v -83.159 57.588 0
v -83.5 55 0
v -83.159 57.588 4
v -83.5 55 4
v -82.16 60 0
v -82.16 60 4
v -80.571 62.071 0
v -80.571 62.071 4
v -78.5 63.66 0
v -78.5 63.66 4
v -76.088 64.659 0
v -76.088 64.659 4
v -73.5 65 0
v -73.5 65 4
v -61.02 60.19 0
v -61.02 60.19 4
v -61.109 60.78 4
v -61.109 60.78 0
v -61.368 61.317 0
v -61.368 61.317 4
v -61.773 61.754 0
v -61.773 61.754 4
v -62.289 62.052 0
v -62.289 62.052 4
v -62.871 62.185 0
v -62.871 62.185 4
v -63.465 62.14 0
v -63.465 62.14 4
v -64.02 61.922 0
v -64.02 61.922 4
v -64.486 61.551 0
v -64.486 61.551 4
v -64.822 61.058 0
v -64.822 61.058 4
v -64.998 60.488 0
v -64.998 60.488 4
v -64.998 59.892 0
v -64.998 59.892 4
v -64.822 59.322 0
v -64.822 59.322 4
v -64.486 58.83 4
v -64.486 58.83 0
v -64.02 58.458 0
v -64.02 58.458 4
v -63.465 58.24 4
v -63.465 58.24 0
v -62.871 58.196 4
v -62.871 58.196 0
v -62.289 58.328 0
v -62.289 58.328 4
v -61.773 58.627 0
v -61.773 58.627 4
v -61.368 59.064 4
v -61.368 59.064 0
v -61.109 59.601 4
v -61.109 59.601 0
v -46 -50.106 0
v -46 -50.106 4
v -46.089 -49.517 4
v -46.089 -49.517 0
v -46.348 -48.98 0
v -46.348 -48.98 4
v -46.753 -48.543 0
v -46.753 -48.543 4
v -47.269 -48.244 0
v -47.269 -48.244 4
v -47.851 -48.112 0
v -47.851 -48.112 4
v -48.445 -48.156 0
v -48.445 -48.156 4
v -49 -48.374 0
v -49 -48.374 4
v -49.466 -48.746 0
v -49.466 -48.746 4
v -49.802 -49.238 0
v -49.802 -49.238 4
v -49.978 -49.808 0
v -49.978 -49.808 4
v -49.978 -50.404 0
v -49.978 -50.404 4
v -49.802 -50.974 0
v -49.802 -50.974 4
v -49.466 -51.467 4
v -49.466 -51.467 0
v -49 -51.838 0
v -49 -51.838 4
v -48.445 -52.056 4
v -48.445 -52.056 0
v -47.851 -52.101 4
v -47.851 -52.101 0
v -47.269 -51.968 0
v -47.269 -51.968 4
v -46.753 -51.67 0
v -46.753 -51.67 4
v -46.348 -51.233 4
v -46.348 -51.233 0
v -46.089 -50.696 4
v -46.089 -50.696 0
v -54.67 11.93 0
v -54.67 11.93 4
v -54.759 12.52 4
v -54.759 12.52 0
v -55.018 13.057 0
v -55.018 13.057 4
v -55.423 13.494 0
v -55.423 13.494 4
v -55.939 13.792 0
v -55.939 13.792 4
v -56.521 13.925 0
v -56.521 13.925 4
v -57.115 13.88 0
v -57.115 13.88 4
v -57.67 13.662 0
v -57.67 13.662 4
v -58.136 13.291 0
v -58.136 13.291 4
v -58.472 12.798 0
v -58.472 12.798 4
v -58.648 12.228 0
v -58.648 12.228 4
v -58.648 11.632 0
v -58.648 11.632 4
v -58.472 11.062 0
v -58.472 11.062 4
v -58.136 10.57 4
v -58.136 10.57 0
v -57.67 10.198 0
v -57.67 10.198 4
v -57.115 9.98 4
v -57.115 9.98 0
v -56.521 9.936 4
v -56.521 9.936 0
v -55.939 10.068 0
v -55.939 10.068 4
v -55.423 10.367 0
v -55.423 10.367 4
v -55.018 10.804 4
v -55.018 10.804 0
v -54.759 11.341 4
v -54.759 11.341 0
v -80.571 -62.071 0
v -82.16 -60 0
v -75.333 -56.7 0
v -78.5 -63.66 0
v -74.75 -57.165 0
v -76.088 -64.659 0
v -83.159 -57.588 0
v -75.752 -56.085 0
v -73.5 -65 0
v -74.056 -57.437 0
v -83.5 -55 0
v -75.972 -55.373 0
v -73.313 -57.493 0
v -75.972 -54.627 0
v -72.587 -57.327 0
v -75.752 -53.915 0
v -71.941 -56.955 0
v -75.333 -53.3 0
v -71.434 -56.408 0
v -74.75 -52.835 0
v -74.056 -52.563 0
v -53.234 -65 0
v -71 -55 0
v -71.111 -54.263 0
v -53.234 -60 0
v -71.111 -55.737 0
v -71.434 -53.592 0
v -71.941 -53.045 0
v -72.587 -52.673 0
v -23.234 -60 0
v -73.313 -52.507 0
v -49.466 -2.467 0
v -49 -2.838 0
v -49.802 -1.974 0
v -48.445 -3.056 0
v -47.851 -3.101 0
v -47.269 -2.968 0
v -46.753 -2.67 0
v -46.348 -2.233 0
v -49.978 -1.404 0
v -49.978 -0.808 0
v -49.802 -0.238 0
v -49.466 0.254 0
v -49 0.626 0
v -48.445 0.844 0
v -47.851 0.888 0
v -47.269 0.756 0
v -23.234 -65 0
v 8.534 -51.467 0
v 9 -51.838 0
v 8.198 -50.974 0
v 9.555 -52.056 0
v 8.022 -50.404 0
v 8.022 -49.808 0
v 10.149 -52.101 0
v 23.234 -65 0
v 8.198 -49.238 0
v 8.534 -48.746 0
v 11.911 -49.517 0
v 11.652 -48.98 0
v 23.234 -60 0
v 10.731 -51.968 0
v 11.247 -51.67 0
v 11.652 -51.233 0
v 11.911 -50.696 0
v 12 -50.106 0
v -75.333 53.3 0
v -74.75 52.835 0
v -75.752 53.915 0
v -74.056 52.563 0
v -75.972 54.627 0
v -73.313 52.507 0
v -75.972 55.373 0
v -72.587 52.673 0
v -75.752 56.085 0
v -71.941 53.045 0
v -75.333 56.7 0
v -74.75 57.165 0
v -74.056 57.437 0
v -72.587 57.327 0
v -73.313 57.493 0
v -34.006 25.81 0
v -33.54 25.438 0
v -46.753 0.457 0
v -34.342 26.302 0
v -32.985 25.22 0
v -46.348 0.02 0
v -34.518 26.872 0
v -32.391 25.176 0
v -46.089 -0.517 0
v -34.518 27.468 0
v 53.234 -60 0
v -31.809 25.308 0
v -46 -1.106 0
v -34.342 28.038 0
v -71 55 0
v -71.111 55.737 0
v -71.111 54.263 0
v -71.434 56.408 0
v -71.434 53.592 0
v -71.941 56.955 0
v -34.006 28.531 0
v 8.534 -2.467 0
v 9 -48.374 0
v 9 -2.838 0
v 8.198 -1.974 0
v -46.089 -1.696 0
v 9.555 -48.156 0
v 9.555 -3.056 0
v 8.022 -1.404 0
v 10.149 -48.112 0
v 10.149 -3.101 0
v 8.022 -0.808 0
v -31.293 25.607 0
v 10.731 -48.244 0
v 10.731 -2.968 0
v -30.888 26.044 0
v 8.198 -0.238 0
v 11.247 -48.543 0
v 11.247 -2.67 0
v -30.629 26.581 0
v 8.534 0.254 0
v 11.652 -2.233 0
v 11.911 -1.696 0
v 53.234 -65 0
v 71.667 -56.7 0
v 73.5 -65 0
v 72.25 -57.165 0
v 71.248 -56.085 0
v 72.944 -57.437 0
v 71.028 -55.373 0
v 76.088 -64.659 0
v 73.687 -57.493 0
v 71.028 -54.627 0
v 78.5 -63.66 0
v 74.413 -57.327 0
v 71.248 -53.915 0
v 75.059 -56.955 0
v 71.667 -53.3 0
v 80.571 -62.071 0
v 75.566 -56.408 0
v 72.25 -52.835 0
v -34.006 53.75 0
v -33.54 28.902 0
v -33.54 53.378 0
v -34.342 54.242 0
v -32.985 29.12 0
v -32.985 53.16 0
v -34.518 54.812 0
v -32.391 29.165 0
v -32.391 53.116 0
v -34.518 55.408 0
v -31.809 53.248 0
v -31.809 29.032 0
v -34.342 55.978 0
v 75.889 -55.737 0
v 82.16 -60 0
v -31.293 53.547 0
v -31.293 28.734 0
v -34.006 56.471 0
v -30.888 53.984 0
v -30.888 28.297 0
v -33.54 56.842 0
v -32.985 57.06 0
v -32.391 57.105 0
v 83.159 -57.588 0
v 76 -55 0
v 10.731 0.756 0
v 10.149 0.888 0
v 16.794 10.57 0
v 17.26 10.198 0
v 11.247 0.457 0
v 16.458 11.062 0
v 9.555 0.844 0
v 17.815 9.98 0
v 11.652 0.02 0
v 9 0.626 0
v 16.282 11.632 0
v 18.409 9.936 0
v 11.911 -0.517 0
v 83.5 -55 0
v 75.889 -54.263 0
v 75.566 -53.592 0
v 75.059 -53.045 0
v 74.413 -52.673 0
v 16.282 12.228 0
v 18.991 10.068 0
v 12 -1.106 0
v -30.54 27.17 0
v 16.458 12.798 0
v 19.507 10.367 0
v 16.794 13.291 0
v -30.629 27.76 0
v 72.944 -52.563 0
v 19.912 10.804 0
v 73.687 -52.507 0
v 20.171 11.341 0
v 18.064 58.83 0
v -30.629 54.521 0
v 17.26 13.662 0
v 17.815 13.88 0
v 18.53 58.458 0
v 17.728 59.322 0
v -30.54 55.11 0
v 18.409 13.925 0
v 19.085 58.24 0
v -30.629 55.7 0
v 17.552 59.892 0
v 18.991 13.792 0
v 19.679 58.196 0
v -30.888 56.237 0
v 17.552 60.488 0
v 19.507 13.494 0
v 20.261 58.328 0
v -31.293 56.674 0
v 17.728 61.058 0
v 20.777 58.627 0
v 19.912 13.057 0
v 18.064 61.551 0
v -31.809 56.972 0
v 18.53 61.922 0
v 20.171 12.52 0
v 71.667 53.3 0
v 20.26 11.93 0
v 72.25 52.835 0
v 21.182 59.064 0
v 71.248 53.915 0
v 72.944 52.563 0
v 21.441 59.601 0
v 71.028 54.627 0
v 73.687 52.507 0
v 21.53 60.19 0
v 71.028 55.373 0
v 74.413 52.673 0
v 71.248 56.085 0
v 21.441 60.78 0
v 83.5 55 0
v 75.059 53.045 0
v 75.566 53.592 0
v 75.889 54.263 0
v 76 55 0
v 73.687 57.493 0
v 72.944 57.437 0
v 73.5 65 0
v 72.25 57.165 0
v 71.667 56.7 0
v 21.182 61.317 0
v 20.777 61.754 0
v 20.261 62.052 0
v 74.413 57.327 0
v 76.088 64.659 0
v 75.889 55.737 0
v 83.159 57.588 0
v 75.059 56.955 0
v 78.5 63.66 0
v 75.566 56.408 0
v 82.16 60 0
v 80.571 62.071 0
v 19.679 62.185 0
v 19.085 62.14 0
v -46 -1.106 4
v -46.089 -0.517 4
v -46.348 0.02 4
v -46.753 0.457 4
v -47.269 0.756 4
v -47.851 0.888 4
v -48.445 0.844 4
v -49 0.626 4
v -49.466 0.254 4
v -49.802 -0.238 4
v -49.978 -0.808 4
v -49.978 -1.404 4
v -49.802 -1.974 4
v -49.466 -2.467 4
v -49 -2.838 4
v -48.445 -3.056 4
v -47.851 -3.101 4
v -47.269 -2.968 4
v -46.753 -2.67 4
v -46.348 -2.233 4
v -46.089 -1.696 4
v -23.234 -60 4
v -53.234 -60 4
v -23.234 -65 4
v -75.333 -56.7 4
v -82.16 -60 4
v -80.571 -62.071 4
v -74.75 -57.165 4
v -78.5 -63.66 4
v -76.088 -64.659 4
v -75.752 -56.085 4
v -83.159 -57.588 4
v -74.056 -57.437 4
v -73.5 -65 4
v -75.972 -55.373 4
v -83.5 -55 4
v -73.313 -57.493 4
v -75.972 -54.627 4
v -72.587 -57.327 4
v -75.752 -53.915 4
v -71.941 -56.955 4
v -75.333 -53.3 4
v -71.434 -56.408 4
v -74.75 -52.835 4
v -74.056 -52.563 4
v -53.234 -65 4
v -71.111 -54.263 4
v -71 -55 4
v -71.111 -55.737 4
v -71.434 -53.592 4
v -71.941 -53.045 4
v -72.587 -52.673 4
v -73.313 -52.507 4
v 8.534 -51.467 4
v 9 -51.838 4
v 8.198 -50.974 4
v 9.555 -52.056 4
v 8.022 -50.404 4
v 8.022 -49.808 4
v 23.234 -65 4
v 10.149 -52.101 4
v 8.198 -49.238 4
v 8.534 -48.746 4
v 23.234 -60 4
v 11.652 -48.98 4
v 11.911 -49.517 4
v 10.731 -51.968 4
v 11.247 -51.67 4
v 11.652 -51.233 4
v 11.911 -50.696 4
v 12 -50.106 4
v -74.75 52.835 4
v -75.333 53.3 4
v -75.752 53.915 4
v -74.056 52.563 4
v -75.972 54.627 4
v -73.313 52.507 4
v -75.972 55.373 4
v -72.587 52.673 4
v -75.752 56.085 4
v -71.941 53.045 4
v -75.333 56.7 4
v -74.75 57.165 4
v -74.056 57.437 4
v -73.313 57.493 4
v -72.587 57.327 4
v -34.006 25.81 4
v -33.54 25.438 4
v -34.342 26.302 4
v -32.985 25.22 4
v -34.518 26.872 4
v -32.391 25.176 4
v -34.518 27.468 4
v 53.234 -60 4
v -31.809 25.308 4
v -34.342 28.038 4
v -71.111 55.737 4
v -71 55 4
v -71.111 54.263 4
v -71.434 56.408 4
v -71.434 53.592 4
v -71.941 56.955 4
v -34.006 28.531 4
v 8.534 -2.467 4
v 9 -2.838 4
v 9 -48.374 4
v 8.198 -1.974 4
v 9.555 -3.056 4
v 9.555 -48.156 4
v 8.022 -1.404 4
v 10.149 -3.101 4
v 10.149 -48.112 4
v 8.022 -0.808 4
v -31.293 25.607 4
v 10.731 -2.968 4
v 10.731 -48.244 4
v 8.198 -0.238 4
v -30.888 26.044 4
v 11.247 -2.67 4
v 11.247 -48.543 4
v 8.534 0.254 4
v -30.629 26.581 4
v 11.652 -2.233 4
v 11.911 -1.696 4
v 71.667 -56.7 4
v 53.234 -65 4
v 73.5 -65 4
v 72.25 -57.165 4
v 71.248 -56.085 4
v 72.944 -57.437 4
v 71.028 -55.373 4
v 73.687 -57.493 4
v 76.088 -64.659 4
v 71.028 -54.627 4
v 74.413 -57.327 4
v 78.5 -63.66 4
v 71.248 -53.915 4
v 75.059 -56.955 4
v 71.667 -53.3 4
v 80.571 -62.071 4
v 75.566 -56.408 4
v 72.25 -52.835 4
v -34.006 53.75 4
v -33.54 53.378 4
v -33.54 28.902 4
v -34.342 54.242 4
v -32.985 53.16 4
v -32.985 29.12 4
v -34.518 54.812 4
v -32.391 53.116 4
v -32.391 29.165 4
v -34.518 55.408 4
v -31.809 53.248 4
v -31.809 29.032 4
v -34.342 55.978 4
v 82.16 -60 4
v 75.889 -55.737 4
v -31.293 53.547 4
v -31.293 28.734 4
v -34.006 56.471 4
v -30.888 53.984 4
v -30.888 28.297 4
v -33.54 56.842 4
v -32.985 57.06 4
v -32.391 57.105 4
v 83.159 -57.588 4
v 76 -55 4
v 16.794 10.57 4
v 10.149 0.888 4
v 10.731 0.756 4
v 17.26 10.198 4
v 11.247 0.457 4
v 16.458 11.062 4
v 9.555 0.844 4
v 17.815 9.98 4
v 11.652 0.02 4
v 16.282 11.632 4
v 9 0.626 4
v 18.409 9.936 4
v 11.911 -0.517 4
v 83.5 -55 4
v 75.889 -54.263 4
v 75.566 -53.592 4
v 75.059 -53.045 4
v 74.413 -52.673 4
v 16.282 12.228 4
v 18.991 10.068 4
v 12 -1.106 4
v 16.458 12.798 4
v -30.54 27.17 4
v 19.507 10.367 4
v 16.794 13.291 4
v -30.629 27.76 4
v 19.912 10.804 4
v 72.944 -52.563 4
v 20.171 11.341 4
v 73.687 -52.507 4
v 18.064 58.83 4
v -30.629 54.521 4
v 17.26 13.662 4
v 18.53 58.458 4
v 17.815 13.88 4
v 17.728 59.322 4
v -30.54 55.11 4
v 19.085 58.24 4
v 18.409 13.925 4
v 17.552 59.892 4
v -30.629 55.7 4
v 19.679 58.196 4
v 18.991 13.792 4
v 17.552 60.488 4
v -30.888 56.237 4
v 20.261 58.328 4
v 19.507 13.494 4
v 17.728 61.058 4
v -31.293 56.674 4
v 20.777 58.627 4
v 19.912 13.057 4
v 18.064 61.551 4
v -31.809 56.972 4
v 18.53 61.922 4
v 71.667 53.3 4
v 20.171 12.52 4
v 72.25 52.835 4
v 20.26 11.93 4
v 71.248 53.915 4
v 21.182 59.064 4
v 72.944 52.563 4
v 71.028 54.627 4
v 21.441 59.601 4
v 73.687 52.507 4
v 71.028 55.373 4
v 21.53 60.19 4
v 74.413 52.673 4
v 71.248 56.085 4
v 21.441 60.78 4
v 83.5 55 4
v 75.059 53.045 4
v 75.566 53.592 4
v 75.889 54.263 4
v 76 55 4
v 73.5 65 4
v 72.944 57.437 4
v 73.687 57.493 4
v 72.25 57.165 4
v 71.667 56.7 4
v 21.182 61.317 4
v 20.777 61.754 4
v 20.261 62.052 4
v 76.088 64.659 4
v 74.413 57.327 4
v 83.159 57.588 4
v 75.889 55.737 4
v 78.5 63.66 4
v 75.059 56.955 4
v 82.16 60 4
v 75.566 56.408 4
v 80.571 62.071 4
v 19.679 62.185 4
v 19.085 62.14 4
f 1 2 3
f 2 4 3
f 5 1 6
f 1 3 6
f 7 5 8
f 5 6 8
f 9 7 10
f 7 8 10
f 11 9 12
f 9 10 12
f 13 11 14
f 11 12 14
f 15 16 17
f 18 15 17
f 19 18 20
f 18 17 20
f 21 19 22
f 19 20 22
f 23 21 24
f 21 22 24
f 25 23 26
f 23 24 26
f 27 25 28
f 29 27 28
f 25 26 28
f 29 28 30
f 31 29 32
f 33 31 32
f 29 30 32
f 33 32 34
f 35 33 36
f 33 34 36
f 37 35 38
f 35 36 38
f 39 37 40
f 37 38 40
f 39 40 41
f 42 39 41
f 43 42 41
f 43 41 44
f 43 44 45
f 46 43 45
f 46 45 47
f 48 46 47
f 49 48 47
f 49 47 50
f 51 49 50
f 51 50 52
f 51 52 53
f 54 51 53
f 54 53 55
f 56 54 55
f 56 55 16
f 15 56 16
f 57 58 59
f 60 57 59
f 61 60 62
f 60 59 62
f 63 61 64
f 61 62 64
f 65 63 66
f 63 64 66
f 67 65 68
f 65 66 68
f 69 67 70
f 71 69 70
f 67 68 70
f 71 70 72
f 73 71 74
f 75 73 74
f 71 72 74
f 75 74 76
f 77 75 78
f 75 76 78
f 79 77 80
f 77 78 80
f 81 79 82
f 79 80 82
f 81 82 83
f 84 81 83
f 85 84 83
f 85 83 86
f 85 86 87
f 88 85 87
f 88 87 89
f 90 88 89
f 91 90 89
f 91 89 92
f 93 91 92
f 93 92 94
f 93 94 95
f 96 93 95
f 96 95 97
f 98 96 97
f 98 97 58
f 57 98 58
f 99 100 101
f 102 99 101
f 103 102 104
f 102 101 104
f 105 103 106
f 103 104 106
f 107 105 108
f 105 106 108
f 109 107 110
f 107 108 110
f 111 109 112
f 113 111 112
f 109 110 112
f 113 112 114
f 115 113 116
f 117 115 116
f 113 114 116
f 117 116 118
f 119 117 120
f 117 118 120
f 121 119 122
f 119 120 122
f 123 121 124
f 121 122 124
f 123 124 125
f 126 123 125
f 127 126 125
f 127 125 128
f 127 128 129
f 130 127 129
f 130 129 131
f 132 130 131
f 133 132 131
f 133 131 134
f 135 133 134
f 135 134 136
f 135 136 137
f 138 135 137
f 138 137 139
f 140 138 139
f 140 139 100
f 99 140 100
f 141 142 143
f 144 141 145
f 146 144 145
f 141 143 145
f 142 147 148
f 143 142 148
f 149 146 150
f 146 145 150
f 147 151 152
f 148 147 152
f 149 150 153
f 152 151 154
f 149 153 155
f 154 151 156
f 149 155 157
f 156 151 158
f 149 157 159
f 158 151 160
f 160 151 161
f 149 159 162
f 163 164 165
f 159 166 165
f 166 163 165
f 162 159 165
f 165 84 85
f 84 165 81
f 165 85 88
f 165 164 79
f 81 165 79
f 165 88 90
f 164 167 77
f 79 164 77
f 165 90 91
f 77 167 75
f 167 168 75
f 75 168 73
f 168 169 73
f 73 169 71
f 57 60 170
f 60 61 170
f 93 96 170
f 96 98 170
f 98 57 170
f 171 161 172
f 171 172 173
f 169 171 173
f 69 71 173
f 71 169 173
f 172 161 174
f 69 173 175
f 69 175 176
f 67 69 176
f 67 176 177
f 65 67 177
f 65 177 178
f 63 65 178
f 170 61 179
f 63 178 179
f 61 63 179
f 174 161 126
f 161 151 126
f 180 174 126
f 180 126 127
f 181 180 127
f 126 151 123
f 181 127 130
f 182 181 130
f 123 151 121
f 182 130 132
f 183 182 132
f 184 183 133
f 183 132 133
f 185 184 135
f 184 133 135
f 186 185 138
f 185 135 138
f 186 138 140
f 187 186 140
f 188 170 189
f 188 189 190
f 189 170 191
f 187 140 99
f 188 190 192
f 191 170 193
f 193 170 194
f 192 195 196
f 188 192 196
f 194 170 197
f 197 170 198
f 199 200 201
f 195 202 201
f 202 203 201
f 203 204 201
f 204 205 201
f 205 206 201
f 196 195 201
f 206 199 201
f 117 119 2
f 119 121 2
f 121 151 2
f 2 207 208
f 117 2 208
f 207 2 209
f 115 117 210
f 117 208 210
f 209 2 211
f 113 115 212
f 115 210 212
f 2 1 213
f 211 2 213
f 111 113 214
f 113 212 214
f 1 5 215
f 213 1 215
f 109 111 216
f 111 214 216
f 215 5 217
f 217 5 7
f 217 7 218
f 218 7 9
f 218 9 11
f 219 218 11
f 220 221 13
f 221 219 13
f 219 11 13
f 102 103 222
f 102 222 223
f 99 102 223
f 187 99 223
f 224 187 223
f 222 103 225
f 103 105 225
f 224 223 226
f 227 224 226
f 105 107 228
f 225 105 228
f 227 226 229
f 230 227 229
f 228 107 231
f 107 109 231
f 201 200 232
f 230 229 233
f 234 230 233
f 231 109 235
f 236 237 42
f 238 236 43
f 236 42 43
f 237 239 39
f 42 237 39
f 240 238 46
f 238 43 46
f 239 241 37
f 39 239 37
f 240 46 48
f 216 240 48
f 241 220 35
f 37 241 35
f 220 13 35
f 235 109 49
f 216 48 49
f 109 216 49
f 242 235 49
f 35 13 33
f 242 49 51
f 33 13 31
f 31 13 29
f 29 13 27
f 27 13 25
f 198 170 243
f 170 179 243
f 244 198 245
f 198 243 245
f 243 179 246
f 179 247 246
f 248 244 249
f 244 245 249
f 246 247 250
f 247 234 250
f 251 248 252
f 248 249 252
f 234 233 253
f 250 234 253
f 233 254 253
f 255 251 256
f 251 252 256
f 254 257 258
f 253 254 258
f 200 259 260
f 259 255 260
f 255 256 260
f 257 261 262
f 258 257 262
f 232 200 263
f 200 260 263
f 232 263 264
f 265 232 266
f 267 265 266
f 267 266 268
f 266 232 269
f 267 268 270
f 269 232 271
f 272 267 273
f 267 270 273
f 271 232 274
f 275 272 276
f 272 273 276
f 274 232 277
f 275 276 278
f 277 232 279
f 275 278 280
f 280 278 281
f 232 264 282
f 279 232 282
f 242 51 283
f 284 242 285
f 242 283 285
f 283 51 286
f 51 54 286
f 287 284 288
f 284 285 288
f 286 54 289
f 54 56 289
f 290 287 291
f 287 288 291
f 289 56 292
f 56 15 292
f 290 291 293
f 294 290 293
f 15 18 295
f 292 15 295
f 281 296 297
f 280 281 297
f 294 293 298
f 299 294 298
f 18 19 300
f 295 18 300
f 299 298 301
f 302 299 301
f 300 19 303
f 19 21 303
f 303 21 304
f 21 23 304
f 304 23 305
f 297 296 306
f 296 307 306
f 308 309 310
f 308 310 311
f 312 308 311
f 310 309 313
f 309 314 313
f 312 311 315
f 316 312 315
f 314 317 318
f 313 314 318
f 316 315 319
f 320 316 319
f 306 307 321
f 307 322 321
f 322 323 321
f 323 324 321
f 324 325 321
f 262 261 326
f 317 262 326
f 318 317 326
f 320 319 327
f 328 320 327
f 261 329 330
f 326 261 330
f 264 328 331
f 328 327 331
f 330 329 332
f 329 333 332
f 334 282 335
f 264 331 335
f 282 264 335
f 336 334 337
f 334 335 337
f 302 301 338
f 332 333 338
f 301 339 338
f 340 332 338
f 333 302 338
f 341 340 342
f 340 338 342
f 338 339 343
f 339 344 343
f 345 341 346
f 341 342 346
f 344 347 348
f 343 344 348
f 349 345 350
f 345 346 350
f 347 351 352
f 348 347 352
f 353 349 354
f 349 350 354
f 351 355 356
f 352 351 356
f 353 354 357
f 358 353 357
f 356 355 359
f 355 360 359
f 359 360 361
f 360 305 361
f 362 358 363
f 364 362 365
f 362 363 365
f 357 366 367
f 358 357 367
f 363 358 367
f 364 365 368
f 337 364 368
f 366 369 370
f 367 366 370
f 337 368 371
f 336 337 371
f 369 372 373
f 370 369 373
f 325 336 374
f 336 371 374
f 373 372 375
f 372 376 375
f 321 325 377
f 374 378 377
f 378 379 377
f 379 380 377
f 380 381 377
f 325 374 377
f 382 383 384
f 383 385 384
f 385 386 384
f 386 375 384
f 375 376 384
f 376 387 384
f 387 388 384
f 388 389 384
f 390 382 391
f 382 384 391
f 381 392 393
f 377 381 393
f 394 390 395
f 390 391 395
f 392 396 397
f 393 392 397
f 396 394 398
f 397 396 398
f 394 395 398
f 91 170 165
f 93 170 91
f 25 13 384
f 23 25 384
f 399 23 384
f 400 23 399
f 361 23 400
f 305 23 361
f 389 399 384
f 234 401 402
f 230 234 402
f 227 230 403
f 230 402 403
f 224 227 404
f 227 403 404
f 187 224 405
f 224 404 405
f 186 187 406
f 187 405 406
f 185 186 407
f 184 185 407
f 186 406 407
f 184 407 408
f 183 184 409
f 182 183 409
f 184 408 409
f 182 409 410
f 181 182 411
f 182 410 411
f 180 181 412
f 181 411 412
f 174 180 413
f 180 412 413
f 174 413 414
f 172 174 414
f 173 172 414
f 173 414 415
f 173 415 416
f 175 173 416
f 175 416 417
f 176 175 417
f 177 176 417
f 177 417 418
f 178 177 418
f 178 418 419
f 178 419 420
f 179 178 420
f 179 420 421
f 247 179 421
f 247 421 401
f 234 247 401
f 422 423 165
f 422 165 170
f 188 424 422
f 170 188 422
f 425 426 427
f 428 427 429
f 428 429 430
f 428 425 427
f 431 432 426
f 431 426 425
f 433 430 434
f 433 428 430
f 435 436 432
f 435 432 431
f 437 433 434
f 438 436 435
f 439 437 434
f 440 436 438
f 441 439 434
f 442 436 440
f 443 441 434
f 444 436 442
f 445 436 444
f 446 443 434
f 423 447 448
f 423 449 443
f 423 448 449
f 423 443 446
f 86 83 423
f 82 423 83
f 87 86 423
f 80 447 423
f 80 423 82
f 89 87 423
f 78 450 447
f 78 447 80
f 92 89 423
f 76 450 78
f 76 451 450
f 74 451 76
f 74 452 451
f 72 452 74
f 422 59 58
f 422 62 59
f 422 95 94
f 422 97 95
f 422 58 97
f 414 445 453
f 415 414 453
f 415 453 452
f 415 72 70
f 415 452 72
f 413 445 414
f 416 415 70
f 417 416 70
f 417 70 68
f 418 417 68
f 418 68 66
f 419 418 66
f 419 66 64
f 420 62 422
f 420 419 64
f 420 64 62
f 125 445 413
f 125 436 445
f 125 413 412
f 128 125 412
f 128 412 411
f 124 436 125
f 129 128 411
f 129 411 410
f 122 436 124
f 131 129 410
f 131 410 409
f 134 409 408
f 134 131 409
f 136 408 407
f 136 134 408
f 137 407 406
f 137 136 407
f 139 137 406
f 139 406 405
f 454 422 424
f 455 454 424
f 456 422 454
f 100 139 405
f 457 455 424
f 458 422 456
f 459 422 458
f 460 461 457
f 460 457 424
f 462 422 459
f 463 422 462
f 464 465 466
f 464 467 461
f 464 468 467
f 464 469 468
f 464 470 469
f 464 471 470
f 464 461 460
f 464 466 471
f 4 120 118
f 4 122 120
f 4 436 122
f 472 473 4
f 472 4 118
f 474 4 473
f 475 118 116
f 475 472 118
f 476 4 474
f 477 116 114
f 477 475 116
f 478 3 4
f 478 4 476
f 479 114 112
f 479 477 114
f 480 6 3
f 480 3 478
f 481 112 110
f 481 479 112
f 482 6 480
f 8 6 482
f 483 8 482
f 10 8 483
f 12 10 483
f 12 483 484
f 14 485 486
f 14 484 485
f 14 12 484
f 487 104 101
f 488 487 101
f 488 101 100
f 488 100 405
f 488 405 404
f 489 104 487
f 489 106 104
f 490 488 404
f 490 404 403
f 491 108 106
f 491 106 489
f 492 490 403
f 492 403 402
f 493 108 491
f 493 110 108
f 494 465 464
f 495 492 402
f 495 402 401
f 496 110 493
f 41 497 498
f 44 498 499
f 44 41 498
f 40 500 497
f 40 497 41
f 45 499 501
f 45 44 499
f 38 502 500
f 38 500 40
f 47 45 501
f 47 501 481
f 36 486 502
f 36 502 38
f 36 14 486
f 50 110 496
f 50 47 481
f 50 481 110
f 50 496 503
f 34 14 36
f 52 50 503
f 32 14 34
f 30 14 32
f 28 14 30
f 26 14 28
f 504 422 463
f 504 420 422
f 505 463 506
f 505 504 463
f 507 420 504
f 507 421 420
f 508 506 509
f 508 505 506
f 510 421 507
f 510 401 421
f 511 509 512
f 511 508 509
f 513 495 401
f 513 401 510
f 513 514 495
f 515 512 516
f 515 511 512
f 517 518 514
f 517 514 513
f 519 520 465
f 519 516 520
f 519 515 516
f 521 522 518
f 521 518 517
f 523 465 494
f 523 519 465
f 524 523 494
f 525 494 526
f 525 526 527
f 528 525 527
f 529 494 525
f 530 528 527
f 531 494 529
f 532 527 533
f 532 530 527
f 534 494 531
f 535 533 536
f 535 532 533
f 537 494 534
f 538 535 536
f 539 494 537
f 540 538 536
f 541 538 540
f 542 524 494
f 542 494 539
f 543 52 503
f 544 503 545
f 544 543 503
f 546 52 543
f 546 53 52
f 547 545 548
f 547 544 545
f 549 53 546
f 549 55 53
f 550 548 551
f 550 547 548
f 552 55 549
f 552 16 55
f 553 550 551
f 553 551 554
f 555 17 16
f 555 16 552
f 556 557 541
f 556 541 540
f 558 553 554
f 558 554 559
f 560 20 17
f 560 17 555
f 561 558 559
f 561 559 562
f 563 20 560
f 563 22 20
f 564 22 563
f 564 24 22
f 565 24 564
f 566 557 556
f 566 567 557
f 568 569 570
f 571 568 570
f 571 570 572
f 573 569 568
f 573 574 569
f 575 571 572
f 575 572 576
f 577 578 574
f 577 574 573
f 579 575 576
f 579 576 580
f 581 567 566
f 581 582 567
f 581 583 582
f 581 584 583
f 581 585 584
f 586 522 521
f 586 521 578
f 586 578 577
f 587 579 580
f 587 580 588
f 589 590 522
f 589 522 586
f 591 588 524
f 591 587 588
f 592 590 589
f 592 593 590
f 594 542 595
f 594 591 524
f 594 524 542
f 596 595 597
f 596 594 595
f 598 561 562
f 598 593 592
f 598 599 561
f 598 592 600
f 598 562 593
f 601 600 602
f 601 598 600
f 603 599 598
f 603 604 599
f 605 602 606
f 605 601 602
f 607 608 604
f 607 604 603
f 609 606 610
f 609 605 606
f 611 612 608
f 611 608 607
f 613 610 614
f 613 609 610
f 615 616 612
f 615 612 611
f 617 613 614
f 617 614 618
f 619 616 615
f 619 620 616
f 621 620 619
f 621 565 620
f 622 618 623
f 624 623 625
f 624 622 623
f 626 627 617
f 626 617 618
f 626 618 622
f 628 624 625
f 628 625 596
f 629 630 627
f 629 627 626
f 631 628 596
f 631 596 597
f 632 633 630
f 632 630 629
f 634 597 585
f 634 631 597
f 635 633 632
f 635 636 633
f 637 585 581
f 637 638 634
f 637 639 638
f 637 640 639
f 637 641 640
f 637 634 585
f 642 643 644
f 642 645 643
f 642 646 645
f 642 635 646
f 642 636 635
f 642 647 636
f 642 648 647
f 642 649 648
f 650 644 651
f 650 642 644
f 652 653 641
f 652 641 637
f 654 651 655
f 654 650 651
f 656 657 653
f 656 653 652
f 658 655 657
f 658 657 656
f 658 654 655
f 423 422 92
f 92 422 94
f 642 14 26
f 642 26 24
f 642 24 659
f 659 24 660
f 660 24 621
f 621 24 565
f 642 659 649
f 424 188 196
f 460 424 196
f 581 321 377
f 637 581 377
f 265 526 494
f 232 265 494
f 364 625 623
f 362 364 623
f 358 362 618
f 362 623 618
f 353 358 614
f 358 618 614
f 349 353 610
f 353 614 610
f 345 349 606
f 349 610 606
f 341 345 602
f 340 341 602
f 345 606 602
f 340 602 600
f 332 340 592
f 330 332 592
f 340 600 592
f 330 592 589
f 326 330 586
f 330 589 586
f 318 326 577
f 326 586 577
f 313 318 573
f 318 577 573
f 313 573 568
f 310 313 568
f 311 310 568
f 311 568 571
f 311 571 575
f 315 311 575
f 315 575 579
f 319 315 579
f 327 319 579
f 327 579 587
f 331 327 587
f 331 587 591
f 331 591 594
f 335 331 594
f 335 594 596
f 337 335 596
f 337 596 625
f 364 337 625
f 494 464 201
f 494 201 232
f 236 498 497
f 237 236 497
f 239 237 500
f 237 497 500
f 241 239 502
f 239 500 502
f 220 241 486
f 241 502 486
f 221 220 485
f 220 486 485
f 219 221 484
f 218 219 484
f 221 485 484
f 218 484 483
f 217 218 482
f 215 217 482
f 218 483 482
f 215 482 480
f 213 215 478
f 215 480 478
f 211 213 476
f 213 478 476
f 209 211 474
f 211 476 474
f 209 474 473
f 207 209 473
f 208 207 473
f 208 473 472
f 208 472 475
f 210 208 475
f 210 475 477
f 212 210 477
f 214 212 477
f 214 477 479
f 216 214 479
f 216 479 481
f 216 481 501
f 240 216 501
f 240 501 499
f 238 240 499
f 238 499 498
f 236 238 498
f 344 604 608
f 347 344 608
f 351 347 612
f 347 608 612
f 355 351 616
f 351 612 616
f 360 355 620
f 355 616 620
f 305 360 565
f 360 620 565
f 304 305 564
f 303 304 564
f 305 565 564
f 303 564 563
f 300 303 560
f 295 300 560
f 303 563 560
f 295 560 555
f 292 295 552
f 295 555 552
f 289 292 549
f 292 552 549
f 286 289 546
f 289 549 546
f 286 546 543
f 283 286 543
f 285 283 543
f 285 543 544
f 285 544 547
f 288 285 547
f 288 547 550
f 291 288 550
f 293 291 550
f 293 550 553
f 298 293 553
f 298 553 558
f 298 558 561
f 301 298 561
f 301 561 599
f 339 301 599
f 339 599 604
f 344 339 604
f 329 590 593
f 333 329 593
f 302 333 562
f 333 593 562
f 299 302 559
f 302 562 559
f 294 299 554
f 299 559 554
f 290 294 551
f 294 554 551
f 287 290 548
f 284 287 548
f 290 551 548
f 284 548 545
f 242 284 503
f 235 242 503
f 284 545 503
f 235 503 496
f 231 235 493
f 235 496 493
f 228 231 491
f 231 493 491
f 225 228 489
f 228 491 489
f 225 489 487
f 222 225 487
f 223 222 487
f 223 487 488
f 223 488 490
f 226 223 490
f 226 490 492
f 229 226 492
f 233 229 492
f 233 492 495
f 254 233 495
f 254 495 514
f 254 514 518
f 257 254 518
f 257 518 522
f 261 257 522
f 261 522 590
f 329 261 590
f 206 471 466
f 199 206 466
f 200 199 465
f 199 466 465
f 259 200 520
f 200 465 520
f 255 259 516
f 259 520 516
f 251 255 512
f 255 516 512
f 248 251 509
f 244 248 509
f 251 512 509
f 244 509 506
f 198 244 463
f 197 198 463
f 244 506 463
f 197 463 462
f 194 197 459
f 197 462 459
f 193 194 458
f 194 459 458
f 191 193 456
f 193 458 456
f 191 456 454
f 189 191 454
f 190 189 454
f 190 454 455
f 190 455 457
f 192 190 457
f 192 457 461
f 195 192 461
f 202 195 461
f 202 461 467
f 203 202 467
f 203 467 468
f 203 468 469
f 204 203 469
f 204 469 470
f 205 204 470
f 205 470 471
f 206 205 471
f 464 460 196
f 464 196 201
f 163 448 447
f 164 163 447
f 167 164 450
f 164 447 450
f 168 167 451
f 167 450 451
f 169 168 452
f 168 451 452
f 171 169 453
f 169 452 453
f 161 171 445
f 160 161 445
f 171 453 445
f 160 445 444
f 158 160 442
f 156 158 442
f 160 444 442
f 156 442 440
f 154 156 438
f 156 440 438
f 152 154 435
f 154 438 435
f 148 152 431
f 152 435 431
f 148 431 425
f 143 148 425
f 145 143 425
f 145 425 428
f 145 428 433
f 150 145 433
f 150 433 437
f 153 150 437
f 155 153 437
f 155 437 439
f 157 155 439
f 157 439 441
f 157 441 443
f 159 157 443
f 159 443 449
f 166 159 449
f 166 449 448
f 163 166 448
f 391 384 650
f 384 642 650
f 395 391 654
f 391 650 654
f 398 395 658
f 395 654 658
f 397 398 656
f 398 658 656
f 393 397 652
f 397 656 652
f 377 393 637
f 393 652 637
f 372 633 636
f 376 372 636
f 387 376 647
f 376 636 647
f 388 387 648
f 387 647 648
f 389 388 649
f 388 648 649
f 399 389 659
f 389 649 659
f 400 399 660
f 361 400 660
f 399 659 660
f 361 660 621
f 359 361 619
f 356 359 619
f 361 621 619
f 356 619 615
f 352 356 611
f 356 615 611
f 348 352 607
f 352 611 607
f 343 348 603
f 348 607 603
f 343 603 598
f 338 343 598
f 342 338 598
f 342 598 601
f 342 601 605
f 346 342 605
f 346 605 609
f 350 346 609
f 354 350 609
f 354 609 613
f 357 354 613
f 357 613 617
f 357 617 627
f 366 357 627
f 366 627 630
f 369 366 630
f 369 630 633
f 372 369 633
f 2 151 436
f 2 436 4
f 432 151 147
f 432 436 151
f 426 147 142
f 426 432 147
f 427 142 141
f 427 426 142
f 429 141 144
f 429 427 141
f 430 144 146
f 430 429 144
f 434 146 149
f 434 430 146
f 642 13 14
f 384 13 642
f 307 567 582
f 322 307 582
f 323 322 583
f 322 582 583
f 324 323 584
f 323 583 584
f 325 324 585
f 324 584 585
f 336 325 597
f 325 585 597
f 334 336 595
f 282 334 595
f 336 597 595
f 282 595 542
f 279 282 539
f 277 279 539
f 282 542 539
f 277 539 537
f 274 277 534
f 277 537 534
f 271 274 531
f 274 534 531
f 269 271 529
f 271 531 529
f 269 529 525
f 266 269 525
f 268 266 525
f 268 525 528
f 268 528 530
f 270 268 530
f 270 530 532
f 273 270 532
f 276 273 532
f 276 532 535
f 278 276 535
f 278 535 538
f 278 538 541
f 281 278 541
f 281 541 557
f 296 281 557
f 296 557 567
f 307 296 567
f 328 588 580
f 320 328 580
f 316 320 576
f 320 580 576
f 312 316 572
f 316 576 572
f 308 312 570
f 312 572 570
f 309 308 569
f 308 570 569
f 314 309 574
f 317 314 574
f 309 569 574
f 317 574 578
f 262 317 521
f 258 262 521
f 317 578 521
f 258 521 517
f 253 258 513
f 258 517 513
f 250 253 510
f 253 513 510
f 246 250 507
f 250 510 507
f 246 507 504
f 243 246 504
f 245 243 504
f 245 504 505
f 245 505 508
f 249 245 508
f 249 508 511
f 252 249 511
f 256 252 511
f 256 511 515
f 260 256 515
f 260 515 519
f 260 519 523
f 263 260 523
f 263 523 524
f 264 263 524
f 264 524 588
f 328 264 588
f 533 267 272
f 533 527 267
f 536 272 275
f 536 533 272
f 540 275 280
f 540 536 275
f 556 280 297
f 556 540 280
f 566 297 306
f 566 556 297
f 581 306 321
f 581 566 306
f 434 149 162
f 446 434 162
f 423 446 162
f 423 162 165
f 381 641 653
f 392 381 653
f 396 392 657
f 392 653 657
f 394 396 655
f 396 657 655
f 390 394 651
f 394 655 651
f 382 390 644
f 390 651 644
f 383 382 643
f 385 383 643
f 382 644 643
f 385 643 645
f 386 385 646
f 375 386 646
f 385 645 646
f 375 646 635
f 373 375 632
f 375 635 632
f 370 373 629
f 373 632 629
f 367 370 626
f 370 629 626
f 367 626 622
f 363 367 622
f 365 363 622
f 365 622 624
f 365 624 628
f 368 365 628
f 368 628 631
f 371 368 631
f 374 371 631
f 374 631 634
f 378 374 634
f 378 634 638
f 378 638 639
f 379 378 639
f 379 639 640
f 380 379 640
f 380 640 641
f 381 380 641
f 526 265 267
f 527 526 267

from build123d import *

# Parameters (mm, degrees)
SKETCH1_W           = 167
SKETCH1_H           = 130
BOSS_EXTRUDE1_DEPTH = 4
FILLET1_R           = 10
FILLET2_R           = 10
SKETCH5_R           = 2.5
CUT_EXTRUDE4_DEPTH  = 70
SKETCH6_W           = 30
SKETCH6_H           = 5
CUT_EXTRUDE5_DEPTH  = 10
SKETCH10_R          = 2
CUT_EXTRUDE9_DEPTH  = 106.892634305
SKETCH11_R          = 2
CUT_EXTRUDE10_DEPTH = 106.892634305


with BuildPart() as part:
    # Sketch1 → Boss-Extrude1 (new body)
    with BuildSketch(Plane.XY):
        Rectangle(SKETCH1_W, SKETCH1_H)
    extrude(amount=BOSS_EXTRUDE1_DEPTH)

    # Fillet1
    fillet1_edges = [part.edges().sort_by_distance(p)[0] for p in [
        (-83.5, -65, 2),
        (-83.5, 65, 2),
    ]]
    fillet(fillet1_edges, radius=FILLET1_R)

    # Fillet2
    fillet2_edges = [part.edges().sort_by_distance(p)[0] for p in [
        (83.5, -65, 2),
        (83.5, 65, 2),
    ]]
    fillet(fillet2_edges, radius=FILLET2_R)

    # Sketch5 → Cut-Extrude4 (cut)
    with BuildSketch(Plane.XY.offset(4)):
        with Locations((-73.5, 55)):
            Circle(SKETCH5_R)
        with Locations((73.5, 55)):
            Circle(SKETCH5_R)
        with Locations((-73.5, -55)):
            Circle(SKETCH5_R)
        with Locations((73.5, -55)):
            Circle(SKETCH5_R)
    extrude(amount=-CUT_EXTRUDE4_DEPTH, mode=Mode.SUBTRACT)

    # Sketch6 → Cut-Extrude5 (cut)
    with BuildSketch(Plane.XY.offset(4)):
        with Locations((-38.233797414, -62.5)):
            Rectangle(SKETCH6_W, SKETCH6_H)
        with Locations((38.233797414, -62.5)):
            Rectangle(SKETCH6_W, SKETCH6_H)
    extrude(amount=-CUT_EXTRUDE5_DEPTH, mode=Mode.SUBTRACT)

    # Sketch10 → Cut-Extrude9 (cut, through all)
    with BuildSketch(Plane.XY.offset(4)):
        with Locations((-48, -1.106245372)):
            Circle(SKETCH10_R)
        with Locations((10, -50.106245372)):
            Circle(SKETCH10_R)
        with Locations((-48, -50.106245372)):
            Circle(SKETCH10_R)
        with Locations((10, -1.106245372)):
            Circle(SKETCH10_R)
    extrude(amount=-CUT_EXTRUDE9_DEPTH, mode=Mode.SUBTRACT)

    # Sketch11 → Cut-Extrude10 (cut, through all)
    with BuildSketch(Plane.XY.offset(4)):
        with Locations((-63.02, 60.190179321)):
            Circle(SKETCH11_R)
        with Locations((-32.54, 55.110179321)):
            Circle(SKETCH11_R)
        with Locations((-32.54, 27.170179321)):
            Circle(SKETCH11_R)
        with Locations((19.53, 60.190179321)):
            Circle(SKETCH11_R)
        with Locations((18.26, 11.930179321)):
            Circle(SKETCH11_R)
        with Locations((-56.67, 11.930179321)):
            Circle(SKETCH11_R)
    extrude(amount=-CUT_EXTRUDE10_DEPTH, mode=Mode.SUBTRACT)


solid = part.part
